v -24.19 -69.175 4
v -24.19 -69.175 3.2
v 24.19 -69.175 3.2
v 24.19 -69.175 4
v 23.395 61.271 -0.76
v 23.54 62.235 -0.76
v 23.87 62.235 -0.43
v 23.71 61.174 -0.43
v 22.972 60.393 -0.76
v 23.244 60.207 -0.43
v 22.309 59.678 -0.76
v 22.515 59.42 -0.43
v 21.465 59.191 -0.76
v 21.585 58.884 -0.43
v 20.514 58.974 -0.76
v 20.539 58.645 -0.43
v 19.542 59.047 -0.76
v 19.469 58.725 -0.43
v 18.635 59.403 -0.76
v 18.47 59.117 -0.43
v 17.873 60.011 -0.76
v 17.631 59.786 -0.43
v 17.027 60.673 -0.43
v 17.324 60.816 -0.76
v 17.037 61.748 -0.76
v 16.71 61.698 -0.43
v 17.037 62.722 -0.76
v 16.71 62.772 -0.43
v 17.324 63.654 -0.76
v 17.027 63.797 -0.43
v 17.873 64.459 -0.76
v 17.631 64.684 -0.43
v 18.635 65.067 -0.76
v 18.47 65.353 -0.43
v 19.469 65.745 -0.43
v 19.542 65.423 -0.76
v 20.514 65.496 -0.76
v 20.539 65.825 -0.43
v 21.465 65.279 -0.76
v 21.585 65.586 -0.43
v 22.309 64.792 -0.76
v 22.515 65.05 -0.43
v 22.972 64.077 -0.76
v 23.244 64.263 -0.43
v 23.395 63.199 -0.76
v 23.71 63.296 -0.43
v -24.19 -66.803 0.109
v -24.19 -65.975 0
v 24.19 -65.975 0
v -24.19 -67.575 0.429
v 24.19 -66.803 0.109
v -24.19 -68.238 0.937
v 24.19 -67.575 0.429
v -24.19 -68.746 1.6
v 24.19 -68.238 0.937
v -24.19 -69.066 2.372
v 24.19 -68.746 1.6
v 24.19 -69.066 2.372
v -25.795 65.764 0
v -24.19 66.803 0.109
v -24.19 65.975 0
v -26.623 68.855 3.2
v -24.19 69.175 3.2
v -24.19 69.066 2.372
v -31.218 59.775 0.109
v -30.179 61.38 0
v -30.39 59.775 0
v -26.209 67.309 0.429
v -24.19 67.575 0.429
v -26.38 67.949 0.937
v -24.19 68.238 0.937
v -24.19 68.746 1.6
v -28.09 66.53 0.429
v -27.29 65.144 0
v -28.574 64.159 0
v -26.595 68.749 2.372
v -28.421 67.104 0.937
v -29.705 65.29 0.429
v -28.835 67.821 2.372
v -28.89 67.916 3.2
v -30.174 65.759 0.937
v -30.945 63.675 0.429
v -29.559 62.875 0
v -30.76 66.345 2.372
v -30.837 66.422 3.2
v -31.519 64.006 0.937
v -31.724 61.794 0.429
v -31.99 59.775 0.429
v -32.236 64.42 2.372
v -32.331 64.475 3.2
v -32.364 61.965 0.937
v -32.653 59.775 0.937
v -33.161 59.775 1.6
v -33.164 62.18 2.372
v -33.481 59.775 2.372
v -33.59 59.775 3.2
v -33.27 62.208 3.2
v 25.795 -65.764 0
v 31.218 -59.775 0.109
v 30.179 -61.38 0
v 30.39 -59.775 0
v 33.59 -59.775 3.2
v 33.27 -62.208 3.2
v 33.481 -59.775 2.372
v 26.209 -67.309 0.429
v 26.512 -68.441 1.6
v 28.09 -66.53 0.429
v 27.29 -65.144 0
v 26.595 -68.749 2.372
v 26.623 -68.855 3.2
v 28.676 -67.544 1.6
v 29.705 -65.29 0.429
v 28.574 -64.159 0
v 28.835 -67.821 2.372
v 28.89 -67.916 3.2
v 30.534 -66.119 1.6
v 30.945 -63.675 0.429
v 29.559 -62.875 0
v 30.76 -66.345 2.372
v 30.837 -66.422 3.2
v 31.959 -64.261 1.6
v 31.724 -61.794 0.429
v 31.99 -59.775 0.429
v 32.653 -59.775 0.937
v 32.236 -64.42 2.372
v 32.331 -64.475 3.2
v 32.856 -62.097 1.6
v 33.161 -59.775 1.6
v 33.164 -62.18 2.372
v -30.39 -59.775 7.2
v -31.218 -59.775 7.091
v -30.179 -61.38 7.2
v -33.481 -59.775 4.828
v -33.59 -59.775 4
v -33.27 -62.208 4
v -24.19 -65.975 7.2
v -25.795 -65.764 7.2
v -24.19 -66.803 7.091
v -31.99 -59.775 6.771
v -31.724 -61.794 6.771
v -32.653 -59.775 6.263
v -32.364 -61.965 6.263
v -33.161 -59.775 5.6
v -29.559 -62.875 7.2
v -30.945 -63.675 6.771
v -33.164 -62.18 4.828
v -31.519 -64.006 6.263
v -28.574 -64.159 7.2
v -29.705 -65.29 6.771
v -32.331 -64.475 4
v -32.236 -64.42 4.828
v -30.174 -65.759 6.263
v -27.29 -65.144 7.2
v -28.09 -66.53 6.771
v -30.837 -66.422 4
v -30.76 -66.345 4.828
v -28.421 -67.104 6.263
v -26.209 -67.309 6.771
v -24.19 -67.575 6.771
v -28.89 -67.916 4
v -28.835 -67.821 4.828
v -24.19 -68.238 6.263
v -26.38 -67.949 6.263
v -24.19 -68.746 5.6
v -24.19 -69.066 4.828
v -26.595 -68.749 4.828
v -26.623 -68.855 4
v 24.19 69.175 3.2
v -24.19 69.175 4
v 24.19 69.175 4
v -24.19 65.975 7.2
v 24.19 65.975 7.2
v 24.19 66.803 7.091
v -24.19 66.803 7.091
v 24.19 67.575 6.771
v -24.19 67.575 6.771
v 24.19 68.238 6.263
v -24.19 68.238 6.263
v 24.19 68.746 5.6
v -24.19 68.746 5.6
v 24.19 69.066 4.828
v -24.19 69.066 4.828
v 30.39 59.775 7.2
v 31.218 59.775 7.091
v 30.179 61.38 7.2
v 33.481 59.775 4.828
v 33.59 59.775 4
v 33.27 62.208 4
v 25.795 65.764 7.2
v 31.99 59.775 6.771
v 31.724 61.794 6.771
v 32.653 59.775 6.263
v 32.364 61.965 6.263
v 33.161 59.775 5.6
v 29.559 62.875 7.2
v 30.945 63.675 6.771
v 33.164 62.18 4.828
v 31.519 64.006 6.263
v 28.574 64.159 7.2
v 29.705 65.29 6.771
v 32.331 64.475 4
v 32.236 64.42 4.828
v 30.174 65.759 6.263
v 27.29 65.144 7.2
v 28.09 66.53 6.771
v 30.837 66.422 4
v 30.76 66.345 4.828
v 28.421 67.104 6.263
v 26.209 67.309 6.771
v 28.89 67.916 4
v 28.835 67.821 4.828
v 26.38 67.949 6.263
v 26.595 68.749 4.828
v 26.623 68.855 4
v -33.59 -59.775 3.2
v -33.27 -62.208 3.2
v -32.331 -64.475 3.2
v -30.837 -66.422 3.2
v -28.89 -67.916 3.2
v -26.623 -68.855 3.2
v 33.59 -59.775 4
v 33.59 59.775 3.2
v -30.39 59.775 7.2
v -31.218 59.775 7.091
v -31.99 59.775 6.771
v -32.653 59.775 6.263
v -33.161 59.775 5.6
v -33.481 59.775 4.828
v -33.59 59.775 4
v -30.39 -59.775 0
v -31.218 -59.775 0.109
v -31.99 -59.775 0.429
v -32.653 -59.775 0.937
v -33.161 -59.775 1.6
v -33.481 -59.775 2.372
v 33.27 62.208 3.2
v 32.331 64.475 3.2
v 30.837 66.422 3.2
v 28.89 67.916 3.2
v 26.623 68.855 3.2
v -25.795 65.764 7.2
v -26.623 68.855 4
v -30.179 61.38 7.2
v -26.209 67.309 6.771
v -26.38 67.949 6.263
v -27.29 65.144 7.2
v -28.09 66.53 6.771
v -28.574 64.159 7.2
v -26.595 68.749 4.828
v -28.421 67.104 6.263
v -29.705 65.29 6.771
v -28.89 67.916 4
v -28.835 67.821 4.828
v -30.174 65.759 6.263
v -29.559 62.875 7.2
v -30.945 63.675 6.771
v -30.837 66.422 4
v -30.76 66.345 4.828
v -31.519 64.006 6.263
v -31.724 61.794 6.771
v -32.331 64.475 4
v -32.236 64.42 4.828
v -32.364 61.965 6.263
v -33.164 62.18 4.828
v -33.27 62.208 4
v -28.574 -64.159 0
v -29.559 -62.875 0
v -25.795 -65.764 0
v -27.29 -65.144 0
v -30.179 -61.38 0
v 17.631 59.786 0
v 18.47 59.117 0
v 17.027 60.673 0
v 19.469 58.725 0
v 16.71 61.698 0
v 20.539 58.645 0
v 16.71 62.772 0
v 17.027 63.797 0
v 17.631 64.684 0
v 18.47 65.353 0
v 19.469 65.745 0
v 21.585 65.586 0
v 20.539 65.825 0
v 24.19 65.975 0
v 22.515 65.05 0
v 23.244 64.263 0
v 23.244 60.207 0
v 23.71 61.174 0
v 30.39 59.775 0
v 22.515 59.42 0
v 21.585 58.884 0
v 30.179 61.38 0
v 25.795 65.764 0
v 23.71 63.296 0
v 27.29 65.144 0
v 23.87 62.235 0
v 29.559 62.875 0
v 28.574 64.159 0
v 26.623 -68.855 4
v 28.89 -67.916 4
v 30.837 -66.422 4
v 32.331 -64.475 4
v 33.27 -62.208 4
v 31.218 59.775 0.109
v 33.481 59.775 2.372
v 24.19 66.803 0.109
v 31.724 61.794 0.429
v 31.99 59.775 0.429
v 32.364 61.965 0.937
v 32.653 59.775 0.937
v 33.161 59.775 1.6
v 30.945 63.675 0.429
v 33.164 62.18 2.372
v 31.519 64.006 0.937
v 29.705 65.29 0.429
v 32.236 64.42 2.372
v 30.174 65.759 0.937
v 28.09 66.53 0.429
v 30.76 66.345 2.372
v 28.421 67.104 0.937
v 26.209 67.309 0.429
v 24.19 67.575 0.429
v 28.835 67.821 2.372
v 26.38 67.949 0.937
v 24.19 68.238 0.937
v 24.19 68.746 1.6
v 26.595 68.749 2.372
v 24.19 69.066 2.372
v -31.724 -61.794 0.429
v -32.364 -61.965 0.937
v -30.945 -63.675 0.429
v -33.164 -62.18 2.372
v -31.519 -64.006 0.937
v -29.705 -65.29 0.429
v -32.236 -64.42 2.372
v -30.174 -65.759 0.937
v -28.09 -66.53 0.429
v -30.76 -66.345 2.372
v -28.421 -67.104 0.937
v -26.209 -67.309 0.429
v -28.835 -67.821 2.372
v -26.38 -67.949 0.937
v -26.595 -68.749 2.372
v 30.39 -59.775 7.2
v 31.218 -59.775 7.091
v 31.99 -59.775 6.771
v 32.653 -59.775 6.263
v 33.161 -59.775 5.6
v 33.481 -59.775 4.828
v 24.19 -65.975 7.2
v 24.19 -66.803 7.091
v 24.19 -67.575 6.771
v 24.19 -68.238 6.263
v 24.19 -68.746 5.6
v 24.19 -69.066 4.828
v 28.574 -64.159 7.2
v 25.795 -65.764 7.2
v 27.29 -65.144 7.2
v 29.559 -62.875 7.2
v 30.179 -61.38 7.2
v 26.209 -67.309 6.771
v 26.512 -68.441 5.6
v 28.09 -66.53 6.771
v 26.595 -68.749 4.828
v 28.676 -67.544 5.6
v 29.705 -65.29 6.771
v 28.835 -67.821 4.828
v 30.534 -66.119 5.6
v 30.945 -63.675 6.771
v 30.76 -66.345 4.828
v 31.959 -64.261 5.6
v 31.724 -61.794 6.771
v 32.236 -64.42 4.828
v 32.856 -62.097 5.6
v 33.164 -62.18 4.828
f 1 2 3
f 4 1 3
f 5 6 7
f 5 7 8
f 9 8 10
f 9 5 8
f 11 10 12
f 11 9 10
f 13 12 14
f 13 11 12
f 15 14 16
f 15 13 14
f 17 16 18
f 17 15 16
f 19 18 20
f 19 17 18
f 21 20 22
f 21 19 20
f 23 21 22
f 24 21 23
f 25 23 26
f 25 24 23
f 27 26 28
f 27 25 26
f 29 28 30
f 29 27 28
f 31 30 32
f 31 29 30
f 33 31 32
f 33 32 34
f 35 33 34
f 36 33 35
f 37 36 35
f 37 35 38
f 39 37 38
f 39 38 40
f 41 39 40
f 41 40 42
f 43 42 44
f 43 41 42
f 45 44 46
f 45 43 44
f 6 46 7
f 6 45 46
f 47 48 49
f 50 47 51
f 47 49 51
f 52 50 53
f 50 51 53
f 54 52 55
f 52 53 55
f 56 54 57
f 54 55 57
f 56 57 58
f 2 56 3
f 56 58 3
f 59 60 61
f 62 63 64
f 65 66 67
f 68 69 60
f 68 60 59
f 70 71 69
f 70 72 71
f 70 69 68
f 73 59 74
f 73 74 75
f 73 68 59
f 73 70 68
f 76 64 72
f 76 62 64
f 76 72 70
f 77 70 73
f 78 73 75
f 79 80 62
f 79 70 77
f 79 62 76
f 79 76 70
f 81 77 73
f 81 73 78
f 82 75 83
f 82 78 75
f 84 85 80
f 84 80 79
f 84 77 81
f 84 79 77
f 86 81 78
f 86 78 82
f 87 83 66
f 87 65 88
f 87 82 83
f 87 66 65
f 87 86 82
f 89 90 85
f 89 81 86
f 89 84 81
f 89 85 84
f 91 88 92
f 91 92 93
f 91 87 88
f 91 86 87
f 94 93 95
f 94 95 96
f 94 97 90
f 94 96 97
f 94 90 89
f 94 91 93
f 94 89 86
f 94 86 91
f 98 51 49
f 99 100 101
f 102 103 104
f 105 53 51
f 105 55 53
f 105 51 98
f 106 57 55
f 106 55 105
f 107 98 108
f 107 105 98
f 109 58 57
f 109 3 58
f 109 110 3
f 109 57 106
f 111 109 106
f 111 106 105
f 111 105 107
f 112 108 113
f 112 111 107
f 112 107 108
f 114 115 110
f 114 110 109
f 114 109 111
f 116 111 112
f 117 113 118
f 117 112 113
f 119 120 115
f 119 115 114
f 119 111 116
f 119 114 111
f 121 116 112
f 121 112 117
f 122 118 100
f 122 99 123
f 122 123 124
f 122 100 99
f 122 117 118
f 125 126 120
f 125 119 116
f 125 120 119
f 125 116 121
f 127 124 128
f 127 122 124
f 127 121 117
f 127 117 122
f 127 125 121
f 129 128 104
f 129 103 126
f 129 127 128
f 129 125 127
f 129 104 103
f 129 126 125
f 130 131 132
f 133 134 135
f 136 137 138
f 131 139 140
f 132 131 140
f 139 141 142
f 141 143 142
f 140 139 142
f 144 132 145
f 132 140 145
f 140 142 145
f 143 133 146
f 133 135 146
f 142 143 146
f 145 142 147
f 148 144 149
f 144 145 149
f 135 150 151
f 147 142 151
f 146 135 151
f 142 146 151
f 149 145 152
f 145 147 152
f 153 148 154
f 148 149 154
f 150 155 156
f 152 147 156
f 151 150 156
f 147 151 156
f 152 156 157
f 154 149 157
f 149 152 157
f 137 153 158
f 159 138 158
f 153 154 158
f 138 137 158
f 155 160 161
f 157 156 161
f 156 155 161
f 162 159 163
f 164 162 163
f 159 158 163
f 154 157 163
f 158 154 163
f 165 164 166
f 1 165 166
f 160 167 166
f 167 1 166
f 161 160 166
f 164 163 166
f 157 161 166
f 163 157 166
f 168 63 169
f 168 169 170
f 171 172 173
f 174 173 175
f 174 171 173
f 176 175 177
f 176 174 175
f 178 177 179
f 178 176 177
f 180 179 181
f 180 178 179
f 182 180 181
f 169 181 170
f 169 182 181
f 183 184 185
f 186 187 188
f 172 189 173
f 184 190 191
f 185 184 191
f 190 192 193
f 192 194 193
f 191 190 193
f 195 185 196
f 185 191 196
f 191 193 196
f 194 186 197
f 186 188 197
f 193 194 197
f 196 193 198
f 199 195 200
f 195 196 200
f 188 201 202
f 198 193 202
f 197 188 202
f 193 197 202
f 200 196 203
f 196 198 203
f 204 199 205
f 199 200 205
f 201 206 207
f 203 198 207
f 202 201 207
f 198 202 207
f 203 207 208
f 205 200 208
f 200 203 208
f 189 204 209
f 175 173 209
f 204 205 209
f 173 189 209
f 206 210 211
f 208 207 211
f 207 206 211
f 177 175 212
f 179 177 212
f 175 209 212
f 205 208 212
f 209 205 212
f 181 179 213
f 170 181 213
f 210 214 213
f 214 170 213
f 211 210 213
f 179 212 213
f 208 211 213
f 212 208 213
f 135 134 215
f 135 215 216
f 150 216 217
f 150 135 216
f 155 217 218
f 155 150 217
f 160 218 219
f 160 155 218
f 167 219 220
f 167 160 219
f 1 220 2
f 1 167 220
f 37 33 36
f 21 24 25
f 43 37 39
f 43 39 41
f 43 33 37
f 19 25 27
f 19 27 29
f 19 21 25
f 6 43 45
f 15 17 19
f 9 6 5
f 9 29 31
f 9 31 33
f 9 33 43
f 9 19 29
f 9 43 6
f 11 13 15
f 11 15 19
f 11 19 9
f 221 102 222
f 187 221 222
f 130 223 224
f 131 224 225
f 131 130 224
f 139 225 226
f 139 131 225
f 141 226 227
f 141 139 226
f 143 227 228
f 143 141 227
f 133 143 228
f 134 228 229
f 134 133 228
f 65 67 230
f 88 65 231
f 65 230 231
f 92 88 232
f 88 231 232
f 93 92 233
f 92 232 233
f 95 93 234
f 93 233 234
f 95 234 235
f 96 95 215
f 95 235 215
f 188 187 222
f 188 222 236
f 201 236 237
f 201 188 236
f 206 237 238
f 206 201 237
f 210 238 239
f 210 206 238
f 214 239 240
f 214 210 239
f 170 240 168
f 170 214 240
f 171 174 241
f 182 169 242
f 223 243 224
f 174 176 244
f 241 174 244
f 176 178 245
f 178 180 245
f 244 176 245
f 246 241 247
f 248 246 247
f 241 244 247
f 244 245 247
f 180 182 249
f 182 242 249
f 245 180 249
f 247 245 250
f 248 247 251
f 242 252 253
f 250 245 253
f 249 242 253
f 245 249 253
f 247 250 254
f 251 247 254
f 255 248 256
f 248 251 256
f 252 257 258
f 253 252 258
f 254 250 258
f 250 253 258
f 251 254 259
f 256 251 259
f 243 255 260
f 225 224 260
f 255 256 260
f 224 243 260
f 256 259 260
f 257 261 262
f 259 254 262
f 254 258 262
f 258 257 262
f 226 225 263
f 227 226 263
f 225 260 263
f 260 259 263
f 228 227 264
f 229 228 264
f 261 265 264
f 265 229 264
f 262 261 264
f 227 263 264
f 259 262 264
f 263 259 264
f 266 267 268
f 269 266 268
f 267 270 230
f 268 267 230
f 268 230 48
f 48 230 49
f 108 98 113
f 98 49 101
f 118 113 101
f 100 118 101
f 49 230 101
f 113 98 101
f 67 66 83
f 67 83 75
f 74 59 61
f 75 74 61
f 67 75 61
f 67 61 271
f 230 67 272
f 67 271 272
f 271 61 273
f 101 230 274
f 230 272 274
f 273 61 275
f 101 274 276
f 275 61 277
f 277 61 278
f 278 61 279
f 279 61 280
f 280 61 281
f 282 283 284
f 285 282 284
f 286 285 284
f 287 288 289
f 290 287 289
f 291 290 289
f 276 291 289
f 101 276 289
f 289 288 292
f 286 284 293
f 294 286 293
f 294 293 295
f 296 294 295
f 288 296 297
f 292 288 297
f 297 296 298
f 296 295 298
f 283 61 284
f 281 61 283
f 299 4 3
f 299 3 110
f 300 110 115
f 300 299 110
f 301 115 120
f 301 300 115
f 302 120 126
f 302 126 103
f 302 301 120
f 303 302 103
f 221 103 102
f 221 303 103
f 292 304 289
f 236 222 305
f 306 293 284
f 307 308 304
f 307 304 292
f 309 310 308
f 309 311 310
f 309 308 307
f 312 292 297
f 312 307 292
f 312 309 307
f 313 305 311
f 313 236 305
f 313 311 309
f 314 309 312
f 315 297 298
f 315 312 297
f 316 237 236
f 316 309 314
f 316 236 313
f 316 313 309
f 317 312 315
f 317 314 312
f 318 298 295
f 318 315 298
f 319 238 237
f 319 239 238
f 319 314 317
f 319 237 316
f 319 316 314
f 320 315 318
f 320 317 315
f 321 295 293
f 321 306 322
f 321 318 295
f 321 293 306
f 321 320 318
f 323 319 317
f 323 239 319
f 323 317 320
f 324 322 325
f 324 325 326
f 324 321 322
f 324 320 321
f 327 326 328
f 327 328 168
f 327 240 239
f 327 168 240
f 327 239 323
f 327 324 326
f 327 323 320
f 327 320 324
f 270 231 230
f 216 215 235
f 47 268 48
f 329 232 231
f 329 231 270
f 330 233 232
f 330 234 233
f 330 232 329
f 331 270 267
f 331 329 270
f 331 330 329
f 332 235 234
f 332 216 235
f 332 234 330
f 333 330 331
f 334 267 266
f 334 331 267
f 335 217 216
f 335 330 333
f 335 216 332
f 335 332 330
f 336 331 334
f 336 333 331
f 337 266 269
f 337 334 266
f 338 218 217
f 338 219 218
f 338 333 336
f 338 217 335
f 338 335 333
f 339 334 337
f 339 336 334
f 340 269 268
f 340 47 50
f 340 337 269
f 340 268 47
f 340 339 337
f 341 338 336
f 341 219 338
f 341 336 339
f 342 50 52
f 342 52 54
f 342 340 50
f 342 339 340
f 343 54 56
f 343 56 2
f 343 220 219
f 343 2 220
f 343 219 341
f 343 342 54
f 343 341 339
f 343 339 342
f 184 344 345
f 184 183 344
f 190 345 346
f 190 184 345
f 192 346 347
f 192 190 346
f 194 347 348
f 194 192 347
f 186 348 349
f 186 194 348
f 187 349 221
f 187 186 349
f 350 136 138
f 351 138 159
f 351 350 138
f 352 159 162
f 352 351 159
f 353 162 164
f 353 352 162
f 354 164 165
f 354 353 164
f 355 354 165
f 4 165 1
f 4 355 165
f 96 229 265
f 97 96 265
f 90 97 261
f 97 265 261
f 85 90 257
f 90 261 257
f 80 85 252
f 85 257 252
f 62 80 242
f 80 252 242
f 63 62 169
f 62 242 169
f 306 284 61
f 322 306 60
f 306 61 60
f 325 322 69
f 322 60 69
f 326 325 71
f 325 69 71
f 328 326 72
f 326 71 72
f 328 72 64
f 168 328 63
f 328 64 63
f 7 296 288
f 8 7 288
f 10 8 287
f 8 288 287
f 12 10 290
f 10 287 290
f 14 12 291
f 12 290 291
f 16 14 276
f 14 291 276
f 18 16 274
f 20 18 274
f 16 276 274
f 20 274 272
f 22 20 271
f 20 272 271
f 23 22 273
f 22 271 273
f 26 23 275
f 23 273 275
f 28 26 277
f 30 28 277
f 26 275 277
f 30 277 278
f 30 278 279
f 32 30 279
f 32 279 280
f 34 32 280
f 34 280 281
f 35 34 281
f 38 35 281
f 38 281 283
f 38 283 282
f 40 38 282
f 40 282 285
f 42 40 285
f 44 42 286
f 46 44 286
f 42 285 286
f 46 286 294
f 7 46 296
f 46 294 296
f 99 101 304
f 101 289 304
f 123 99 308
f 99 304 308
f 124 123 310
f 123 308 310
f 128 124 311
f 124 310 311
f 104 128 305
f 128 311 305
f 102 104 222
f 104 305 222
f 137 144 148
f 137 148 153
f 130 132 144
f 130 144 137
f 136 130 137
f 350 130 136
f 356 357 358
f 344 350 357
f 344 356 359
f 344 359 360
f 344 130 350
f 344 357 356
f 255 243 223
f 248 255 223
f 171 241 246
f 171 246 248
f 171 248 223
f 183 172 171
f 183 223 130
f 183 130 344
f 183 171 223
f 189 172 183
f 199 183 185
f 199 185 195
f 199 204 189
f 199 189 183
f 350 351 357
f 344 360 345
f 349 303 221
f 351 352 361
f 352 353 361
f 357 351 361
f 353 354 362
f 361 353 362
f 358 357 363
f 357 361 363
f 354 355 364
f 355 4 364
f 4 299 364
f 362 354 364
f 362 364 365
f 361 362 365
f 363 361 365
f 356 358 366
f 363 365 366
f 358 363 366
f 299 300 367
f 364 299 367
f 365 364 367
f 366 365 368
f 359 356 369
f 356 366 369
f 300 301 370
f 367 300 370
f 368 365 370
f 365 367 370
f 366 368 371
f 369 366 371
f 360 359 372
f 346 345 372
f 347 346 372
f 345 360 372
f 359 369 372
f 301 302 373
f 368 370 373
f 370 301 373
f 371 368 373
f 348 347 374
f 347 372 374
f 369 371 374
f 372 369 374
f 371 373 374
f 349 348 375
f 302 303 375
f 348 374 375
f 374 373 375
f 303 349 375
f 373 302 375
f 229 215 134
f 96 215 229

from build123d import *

# Parameters (mm, degrees)
F0_W     = 67.18
F0_H     = 138.35
F1_DEPTH = 7.2
F2_R     = 9.4
F3_R     = 3.2
F4_R     = 3.6
F5_DEPTH = 0.76
F6_SIZE  = 0.33


with BuildPart() as f1:
    # F0 (on Top) → F1 (new body)
    with BuildSketch(Plane.XY):
        Rectangle(F0_W, F0_H)
    extrude(amount=F1_DEPTH)

    # F2
    f2_edges = [f1.edges().sort_by_distance(p)[0] for p in [
        (33.59, 69.175, 3.6),
        (-33.59, 69.175, 3.6),
        (-33.59, -69.175, 3.6),
        (33.59, -69.175, 3.6),
    ]]
    fillet(f2_edges, radius=F2_R)

    # F3
    f3_edges = [f1.edges().sort_by_distance(p)[0] for p in [
        (33.59, 0, 0),
        (33.59, 0, 7.2),
    ]]
    fillet(f3_edges, radius=F3_R)

    # F4 (on face) → F5 (join)
    with BuildSketch(Plane(origin=(0, 0, 0), x_dir=(1, 0, 0), z_dir=(0, 0, -1))):
        with Locations((20.27, -62.235)):
            Circle(F4_R)
    extrude(amount=F5_DEPTH)

    # F6
    f6_edges = [f1.edges().sort_by_distance(p)[0] for p in [
        (16.67, 62.235, -0.76),
    ]]
    chamfer(f6_edges, length=F6_SIZE)


solid = f1.part
